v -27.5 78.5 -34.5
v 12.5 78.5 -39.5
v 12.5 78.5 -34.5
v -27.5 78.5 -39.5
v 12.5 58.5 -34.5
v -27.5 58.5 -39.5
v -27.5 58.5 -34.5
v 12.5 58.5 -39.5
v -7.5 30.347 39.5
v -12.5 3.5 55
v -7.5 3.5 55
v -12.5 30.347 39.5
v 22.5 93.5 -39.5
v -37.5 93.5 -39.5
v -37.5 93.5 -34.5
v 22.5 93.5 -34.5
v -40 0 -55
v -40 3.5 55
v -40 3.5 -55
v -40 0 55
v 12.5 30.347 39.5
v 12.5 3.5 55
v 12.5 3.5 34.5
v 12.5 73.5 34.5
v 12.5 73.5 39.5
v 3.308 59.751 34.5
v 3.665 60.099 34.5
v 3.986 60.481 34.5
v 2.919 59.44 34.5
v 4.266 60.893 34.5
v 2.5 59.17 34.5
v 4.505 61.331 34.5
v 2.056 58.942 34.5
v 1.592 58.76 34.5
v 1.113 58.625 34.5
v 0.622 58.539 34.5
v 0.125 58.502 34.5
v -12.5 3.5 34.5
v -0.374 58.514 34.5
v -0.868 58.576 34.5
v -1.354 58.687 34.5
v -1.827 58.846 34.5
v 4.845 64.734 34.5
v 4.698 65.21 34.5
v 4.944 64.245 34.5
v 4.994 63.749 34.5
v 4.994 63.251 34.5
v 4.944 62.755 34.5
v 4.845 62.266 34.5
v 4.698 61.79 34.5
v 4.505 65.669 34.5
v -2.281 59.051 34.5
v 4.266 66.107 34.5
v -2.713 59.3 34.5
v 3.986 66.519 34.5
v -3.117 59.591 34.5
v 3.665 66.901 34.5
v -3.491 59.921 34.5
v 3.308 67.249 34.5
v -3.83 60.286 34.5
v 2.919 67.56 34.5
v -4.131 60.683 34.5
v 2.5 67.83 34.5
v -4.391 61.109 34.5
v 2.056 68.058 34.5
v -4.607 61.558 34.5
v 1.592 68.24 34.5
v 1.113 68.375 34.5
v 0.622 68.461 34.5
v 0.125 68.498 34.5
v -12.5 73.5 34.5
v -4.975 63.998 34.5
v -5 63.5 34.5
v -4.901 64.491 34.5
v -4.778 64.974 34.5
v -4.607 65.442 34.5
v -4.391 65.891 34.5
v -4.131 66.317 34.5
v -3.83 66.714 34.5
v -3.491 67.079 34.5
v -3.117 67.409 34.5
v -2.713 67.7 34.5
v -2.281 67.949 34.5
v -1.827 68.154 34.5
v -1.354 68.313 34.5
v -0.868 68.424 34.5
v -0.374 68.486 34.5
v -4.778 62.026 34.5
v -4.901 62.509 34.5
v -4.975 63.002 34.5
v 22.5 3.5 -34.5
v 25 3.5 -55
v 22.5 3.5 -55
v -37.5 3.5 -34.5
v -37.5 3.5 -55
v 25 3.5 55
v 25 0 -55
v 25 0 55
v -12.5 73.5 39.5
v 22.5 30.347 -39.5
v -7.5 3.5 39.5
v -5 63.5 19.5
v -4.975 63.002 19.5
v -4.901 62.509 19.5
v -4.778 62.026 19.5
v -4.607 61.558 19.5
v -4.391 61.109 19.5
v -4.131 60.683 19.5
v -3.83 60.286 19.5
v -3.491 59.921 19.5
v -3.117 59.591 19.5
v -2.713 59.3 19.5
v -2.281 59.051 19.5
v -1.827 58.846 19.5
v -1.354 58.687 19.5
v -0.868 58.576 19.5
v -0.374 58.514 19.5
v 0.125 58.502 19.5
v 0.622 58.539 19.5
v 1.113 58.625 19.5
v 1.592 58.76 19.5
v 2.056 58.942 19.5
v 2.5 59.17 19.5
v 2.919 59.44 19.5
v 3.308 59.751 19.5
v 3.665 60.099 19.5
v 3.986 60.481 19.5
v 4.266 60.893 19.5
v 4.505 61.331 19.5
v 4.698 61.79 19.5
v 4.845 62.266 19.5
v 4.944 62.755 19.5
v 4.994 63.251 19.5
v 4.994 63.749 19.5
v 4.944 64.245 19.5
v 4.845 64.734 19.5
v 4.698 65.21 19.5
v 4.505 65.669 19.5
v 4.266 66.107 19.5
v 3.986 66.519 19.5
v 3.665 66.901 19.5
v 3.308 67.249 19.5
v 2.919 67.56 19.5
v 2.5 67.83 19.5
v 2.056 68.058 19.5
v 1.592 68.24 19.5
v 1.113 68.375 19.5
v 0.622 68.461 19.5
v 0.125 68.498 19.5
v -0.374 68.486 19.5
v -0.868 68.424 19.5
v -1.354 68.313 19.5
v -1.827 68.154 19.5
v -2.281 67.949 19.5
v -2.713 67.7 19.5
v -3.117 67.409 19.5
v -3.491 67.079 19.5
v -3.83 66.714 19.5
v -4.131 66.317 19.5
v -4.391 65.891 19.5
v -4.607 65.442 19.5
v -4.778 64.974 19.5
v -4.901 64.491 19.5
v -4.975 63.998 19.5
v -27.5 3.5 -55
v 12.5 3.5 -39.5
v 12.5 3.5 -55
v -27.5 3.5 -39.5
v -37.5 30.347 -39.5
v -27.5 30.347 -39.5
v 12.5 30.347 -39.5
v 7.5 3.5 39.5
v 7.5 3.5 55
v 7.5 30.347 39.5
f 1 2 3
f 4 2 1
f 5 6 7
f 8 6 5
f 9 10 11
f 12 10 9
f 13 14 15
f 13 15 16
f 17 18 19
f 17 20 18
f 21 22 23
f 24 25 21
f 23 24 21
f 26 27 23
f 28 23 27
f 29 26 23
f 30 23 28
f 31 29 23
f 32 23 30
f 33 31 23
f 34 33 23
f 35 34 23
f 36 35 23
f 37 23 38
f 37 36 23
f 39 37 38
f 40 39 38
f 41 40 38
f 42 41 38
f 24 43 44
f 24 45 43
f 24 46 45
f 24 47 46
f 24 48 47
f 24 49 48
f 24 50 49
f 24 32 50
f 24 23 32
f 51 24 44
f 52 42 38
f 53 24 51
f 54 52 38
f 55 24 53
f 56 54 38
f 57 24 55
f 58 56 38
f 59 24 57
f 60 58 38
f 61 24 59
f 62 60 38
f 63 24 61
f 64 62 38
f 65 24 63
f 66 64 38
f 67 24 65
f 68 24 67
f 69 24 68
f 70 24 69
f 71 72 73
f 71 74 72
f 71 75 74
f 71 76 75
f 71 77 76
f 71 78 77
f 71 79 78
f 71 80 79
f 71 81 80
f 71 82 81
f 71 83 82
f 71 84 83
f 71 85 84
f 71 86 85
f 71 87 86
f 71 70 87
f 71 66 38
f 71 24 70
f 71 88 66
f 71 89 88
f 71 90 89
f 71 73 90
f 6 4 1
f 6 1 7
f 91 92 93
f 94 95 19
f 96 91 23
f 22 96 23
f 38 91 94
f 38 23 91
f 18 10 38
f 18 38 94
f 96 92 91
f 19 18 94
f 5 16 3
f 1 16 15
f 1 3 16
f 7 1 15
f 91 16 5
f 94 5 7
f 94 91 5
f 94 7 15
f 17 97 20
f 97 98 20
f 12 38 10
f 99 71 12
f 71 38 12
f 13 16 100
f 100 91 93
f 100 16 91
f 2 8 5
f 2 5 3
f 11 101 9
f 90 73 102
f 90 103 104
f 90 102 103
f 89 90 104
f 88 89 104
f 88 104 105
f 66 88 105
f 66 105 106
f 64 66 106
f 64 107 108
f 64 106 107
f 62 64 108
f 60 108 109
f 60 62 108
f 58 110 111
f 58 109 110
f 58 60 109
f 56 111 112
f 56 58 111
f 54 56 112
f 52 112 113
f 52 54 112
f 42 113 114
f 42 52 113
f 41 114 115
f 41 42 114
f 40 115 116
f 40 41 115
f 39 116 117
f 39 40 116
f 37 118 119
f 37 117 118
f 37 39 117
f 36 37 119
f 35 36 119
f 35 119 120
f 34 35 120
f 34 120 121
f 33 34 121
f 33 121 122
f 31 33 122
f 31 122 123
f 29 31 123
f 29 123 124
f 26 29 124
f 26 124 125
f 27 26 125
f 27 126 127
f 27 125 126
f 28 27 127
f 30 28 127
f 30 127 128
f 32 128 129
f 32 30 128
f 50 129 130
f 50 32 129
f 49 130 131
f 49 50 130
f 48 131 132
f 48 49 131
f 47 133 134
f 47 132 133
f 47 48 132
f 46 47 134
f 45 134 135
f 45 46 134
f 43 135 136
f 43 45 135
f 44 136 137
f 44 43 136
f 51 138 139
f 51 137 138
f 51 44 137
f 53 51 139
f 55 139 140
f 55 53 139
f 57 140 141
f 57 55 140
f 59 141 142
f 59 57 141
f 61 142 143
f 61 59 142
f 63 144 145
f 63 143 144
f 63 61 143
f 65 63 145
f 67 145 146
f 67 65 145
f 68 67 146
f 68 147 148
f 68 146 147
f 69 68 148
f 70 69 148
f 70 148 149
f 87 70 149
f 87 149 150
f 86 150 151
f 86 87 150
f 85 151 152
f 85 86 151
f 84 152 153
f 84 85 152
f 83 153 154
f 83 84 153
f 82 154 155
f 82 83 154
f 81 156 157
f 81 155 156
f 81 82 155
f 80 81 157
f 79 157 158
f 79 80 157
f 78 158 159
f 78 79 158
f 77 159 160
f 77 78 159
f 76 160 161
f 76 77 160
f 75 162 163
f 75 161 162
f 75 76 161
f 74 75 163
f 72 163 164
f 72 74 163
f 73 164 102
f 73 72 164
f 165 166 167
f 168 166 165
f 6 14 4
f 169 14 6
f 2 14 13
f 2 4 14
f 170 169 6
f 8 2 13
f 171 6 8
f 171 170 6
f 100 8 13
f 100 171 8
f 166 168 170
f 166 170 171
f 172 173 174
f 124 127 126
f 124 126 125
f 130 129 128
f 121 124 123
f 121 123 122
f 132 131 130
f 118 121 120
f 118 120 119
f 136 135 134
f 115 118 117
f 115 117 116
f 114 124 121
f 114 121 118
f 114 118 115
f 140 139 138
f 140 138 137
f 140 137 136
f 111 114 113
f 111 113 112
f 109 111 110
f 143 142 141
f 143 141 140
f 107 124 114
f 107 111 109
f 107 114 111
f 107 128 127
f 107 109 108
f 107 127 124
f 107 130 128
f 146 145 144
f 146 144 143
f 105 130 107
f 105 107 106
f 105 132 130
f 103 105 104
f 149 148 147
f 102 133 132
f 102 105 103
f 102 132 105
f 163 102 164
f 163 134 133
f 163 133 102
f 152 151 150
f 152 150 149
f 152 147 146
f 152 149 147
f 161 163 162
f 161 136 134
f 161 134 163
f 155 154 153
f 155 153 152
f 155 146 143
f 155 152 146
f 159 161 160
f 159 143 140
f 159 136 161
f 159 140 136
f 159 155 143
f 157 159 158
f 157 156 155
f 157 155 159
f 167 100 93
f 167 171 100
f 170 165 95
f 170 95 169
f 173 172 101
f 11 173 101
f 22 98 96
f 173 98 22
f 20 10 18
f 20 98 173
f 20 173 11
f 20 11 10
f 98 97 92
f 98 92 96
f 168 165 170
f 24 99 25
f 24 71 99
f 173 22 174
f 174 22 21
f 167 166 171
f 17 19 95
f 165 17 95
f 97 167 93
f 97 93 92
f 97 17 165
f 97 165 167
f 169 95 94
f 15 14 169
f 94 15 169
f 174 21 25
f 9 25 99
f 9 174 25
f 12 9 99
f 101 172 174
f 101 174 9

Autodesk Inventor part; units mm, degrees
ref_plane "YZ Plane" through (0, 0, 0) normal (1, 0, 0) x (0, 1, 0)
ref_plane "XZ Plane" through (0, 0, 0) normal (0, 1, 0) x (-1, 0, 0)
ref_plane "XY Plane" through (0, 0, 0) normal (0, 0, 1) x (1, 0, 0)
sketch "Szkic1" plane through (0, 0, 0) normal (0, 1, 0) x (-1, 0, 0)
  line L0 (-25, 55) -> (40, 55)
  line L1 (40, 55) -> (40, -55)
  line L2 (40, -55) -> (-25, -55)
  line L3 (-25, -55) -> (-25, 55)
  point P0 (0, 0)
  point P1 (-25, 0)
  point P2 (40, 0)
  dimension "d0" = 65
  dimension "d1" = 110
  dimension "d2" = 55
  dimension "d25" = 40
extrude "Wyciągnięcie proste1" add sketch "Szkic1" along normal blind 3.5
sketch "Szkic2" plane through (0, 3.5, 0) normal (0, 1, 0) x (1, 0, 0)
  line L0 (12.5, -39.5) -> (-12.5, -39.5)
  line L1 (-12.5, -39.5) -> (-12.5, -34.5)
  line L2 (-12.5, -34.5) -> (12.5, -34.5)
  line L3 (12.5, -34.5) -> (12.5, -39.5)
  point P0 (0, 0)
  point P1 (0, -34.5)
  dimension "d6" = 25
  dimension "d7" = 5
  dimension "d8" = 34.5
  dimension "d9" = 12.5
extrude "Wyciągnięcie proste2" add sketch "Szkic2" along normal blind 70
sketch "Szkic3" plane through (12.5, 3.5, 34.5) normal (0, 0, -1) x (-1, 0, 0)
  circle A0 centre (12.5, 60) radius 4.5
  line L0 (-12.5, 0) -> (52.5, 0) projected
  line L1 (25, 0) -> (25, 70) projected
  point P0 (12.5, -3.5)
  dimension "d16" = 9
  dimension "d17" = 60
  dimension "d18" = 12.5
extrude "Wyciągnięcie proste3" cut sketch "Szkic3" against normal up to next
sketch "Szkic4" plane through (0, 3.5, 0) normal (0, 1, 0) x (1, 0, 0)
  line L0 (-32.5, 34.5) -> (17.5, 34.5)
  line L1 (17.5, 34.5) -> (17.5, 39.5)
  line L2 (17.5, 39.5) -> (-32.5, 39.5)
  line L3 (-32.5, 39.5) -> (-32.5, 34.5)
  line L4 (12.5, -34.5) -> (-12.5, -34.5) projected
  line L5 (25, -55) -> (25, 55) projected
  point P0 (0, 0)
  point P1 (-7.5, 39.5)
  point P2 (17.5, 37)
  dimension "d22" = 50
  dimension "d23" = 5
  dimension "d24" = 69
  dimension "d26" = 7.5
extrude "Wyciągnięcie proste4" add sketch "Szkic4" along normal blind 90
sketch "Szkic5" plane through (17.5, 3.5, -39.5) normal (0, 0, -1) x (-1, 0, 0)
  line L0 (5, 75) -> (45, 75)
  line L1 (45, 75) -> (45, 55)
  line L2 (45, 55) -> (5, 55)
  line L3 (5, 55) -> (5, 75)
  line L4 (0, 0) -> (0, 90) projected
  line L5 (-7.5, 0) -> (57.5, 0) projected
  point P0 (17.5, -3.5)
  point P1 (45, 65)
  dimension "d29" = 40
  dimension "d30" = 20
  dimension "d31" = 5
  dimension "d33" = 65
extrude "Wyciągnięcie proste5" cut sketch "Szkic5" against normal up to next
sketch "Szkic6" plane through (-32.5, 3.5, -39.5) normal (-1, 0, 0) x (0, 0, 1)
  line L0 (-15.5, 0) -> (94.5, 0) projected
  line L1 (-15.5, 0) -> (0, 26.8468)
  line L2 (-15.5, 0) -> (15.5, 0) construction
  line L3 (0, 0) -> (0, 90) projected
  line L4 (0, 26.8468) -> (0, 0)
  line L5 (0, 0) -> (-15.5, 0)
  point P0 (39.5, -3.5)
  dimension "d36" = 60
extrude "Wyciągnięcie proste6" add sketch "Szkic6" along normal mid plane 10
sketch "Szkic7" plane through (17.5, 3.5, -34.5) normal (1, 0, 0) x (0, 0, -1)
  line L0 (0, 0) -> (5, 0) projected
  line L1 (5, 26.8468) -> (20.5, 0) projected
  line L2 (20.5, 0) -> (5, 26.8468)
  line L3 (5, 26.8468) -> (5, 0)
  line L4 (5, 0) -> (20.5, 0)
  point P0 (-34.5, -3.5)
  point P1 (5, 0)
extrude "Wyciągnięcie proste7" add sketch "Szkic7" along normal mid plane 10
sketch "Szkic8" plane through (12.5, 3.5, 39.5) normal (1, 0, 0) x (0, 0, -1)
  line L0 (-15.5, 0) -> (94.5, 0) projected
  line L1 (-15.5, 0) -> (0, 26.8468)
  line L2 (-15.5, 0) -> (15.5, 0) construction
  line L3 (0, 0) -> (0, 70) projected
  line L4 (0, 26.8468) -> (0, 0)
  line L5 (0, 0) -> (-15.5, 0)
  point P0 (39.5, -3.5)
  dimension "d41" = 60
extrude "Wyciągnięcie proste8" add sketch "Szkic8" against normal blind 5
sketch "Szkic9" plane through (-12.5, 3.5, 34.5) normal (-1, 0, 0) x (0, 0, 1)
  line L0 (-89.5, 0) -> (20.5, 0) projected
  line L1 (20.5, 0) -> (5, 26.8468)
  line L2 (5, 0) -> (5, 70) projected
  line L3 (20.5, -3.5) -> (20.5, 0) projected
  line L4 (5, 0) -> (20.5, 0)
  line L5 (5, 0) -> (0, 0) projected
  line L6 (5, 26.8468) -> (5, 0)
  line L7 (5, 0) -> (20.5, 0)
  point P0 (-34.5, -3.5)
  dimension "d44" = 120
extrude "Wyciągnięcie proste9" add sketch "Szkic9" against normal blind 5
sketch "Szkic10" plane through (0, 3.5, 0) normal (0, 1, 0) x (1, 0, 0)
  line L0 (17.5, 34.5) -> (17.5, 39.5) projected
  line L1 (17.5, 34.5) -> (22.5, 34.5)
  line L2 (22.5, 34.5) -> (22.5, 39.5)
  line L3 (22.5, 39.5) -> (17.5, 39.5)
  line L4 (17.5, 39.5) -> (17.5, 34.5)
  line L5 (-32.5, 39.5) -> (-32.5, 34.5) projected
  line L6 (-32.5, 34.5) -> (-37.5, 34.5)
  line L7 (-37.5, 34.5) -> (-37.5, 39.5)
  line L8 (-37.5, 39.5) -> (-32.5, 39.5)
  line L9 (-32.5, 39.5) -> (-32.5, 34.5)
  point P0 (0, 0)
  dimension "d47" = 5
  dimension "d48" = 5
  dimension "d49" = 5
extrude "Wyciągnięcie proste10" add sketch "Szkic10" along normal blind 90
sketch "Szkic11" plane through (12.5, 3.5, 34.5) normal (0, 0, -1) x (-1, 0, 0)
  circle A0 centre (12.5, 60) radius 4.5 projected
  circle A1 centre (12.5, 60) radius 4.5
  line L0 (0, 55) -> (0, 75) projected
  point P0 (12.5, -3.5)
extrude "Wyciągnięcie proste11" add sketch "Szkic11" against normal blind 5
sketch "Szkic12" plane through (12.5, 3.5, 34.5) normal (0, 0, -1) x (-1, 0, 0)
  circle A0 centre (12.5, 60) radius 5
  line L0 (0, 70) -> (25, 70) projected
  line L1 (25, 0) -> (25, 70) projected
  point P0 (12.5, -3.5)
  dimension "d55" = 10
  dimension "d56" = 10
  dimension "d57" = 12.5
extrude "Wyciągnięcie proste12" add sketch "Szkic12" along normal blind 15
